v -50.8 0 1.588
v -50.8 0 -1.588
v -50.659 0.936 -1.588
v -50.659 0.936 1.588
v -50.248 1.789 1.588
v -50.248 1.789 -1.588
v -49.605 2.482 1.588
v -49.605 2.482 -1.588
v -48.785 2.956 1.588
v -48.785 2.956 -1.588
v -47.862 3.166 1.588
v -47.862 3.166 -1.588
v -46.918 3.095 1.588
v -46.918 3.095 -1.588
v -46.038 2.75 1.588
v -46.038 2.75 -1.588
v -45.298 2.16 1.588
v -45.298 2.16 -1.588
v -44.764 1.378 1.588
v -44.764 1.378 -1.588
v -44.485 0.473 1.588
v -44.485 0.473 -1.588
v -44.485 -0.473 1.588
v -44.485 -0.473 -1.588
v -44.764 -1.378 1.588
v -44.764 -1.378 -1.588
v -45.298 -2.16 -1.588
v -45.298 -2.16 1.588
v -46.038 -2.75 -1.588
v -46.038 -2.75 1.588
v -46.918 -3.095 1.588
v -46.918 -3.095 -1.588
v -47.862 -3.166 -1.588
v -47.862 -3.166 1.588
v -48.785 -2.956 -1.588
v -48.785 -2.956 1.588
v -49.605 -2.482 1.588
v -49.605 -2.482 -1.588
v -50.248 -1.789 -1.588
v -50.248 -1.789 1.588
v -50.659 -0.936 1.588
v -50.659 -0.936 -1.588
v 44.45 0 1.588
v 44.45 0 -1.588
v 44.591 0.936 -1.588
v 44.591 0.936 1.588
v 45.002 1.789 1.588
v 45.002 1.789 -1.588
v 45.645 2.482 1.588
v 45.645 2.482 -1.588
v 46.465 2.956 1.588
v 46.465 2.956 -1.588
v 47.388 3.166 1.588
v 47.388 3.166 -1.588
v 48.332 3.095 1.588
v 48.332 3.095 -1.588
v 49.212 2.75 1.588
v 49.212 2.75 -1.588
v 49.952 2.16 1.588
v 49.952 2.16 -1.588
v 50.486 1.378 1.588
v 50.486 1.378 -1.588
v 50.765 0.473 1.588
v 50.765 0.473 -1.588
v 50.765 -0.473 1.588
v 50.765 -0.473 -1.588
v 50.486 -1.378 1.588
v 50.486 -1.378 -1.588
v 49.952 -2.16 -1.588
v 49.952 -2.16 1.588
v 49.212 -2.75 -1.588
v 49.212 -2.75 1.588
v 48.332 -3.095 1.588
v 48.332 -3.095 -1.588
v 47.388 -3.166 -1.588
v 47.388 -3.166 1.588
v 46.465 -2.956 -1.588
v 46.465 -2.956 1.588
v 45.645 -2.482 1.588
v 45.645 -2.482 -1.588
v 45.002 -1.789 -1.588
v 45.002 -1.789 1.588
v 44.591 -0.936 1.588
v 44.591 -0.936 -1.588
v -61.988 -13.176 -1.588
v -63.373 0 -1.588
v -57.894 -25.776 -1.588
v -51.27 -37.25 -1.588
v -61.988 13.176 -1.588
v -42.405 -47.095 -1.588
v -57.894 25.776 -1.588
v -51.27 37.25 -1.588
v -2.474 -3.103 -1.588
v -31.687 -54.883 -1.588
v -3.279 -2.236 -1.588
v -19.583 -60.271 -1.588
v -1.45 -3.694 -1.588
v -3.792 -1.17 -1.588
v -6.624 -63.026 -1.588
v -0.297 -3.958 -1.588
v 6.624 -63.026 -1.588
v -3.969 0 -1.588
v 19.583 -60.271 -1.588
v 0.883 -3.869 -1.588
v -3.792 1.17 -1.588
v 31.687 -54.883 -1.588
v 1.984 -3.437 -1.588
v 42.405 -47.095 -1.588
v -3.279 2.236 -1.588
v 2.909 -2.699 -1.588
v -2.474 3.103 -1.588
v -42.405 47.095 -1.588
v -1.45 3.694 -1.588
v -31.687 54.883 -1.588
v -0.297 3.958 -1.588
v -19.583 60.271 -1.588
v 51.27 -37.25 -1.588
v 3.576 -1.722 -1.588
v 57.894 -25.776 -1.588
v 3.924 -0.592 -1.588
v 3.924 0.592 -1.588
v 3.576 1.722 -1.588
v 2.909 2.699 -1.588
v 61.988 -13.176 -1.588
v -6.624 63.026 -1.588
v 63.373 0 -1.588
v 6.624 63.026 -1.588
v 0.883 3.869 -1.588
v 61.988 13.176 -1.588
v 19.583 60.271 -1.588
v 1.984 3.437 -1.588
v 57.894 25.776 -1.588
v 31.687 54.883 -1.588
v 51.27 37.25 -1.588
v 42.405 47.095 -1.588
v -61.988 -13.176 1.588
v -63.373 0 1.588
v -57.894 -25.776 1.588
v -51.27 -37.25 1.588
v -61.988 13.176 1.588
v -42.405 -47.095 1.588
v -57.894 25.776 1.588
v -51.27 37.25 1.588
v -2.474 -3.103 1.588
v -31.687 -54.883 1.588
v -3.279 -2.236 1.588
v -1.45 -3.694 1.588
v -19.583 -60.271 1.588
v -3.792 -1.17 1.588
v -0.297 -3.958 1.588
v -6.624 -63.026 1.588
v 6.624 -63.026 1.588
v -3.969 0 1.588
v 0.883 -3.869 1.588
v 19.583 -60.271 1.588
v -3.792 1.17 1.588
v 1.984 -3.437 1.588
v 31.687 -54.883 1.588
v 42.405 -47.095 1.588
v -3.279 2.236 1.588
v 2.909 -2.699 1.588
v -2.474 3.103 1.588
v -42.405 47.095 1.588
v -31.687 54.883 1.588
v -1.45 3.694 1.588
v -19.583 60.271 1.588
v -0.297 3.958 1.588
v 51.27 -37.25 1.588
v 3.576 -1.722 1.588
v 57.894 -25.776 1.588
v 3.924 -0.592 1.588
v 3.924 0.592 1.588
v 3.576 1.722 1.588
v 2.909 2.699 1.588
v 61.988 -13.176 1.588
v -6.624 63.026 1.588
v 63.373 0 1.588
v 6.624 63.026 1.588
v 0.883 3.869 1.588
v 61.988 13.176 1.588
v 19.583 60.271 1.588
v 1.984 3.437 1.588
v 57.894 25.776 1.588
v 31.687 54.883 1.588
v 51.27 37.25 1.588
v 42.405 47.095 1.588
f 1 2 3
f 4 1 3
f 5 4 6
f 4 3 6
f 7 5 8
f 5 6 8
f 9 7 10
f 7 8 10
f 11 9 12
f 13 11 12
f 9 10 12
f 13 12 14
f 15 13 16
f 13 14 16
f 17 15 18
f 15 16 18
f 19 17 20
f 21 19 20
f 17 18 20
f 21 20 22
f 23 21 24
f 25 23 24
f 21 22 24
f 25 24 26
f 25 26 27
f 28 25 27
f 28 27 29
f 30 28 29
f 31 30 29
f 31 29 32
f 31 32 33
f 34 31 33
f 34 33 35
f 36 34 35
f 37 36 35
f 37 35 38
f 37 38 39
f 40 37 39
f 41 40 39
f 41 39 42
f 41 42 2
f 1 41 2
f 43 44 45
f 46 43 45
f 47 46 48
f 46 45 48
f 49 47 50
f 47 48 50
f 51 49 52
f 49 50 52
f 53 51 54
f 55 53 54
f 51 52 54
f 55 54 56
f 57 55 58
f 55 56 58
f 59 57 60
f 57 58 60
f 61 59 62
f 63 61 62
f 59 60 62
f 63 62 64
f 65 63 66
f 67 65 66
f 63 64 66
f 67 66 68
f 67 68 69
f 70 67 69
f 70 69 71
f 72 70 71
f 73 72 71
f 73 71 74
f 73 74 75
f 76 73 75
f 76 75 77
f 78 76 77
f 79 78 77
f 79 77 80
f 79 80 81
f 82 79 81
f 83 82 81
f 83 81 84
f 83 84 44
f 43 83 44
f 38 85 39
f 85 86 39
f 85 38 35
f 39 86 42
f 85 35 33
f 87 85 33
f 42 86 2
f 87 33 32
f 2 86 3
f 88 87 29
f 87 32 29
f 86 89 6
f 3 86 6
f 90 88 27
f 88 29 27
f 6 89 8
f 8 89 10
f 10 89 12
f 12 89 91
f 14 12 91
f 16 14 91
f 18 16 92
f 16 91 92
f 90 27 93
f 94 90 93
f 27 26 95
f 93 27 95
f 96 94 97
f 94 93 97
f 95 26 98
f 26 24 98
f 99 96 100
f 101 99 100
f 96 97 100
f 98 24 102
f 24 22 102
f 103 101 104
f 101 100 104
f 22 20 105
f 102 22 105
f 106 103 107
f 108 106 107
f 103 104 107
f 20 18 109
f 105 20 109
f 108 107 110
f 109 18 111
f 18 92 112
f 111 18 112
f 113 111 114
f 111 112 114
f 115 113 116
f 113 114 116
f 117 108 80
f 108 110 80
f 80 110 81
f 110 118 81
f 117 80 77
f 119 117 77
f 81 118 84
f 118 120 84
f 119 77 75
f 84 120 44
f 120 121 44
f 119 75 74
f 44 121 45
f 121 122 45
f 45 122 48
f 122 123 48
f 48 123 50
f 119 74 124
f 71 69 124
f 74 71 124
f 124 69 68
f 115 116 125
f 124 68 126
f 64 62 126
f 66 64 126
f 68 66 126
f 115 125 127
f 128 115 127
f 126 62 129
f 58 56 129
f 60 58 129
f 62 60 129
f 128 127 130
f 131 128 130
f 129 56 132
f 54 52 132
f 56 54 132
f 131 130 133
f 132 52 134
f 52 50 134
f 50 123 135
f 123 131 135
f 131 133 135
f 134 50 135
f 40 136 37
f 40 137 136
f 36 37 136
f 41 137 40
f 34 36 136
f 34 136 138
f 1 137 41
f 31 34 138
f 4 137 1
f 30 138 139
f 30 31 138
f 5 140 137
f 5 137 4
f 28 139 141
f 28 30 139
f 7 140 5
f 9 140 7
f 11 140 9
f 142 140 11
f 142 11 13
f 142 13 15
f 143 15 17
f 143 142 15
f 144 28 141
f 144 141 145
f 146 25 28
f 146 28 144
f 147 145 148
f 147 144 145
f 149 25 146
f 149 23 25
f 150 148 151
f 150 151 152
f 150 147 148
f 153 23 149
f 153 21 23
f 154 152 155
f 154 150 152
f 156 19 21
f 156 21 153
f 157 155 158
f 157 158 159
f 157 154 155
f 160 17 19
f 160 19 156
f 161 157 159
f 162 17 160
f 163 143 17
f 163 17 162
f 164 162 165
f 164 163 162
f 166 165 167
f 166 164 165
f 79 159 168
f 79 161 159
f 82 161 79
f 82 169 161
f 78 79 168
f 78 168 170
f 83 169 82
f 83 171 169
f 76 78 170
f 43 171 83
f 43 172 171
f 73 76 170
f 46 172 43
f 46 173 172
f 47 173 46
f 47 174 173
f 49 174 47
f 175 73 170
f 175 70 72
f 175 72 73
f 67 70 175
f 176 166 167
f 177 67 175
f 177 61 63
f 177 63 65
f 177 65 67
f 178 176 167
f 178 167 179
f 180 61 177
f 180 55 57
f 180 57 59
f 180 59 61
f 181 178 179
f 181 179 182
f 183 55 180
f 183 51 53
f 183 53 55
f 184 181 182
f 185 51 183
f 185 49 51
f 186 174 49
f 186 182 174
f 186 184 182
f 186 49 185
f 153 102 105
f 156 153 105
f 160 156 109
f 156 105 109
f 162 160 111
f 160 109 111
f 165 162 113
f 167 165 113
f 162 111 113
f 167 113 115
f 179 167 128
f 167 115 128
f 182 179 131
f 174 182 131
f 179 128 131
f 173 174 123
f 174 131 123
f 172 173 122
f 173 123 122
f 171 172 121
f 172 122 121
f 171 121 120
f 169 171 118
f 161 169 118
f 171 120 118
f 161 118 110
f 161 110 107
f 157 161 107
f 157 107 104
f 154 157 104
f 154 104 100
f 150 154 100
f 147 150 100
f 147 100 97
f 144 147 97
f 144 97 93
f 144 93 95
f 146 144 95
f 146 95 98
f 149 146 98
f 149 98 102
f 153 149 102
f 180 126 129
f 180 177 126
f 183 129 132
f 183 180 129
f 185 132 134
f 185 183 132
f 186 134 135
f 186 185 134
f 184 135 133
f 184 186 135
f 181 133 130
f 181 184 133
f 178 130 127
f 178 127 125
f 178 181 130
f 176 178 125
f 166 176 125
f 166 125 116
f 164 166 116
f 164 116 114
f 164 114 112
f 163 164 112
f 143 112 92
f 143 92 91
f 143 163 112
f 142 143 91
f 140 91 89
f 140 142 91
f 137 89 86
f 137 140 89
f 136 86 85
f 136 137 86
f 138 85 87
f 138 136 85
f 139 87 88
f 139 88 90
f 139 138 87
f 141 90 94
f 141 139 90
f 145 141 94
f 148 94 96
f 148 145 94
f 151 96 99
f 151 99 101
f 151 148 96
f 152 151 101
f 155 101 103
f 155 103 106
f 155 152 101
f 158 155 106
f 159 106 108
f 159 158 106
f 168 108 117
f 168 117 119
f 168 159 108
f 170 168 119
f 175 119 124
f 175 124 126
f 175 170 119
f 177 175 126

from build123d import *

# Parameters (mm, degrees)
SKETCH1_R                          = 63.373
BOSS_EXTRUDE1_DEPTH                = 1.5875
F_1_4_0_25_DIAMETER_HOLE1_D        = 6.35
F_5_16_0_3125_DIAMETER_HOLE1_D     = 7.9375
F_5_16_0_3125_DIAMETER_HOLE1_DEPTH = 3.302


with BuildPart() as part:
    # Sketch1 → Boss-Extrude1 (new body, symmetric)
    with BuildSketch(Plane.XY):
        Circle(SKETCH1_R)
    extrude(amount=BOSS_EXTRUDE1_DEPTH, both=True)

    # 1/4 (0.25) Diameter Hole1 (through all)
    with Locations(Plane.XY.offset(1.5875)):
        with Locations((-47.625, 0), (47.625, 0)):
            Hole(F_1_4_0_25_DIAMETER_HOLE1_D / 2)

    # 5/16 (0.3125) Diameter Hole1
    with Locations(Plane.XY.offset(1.5875)):
        with Locations((0, 0)):
            Hole(F_5_16_0_3125_DIAMETER_HOLE1_D / 2, depth=F_5_16_0_3125_DIAMETER_HOLE1_DEPTH)


solid = part.part
